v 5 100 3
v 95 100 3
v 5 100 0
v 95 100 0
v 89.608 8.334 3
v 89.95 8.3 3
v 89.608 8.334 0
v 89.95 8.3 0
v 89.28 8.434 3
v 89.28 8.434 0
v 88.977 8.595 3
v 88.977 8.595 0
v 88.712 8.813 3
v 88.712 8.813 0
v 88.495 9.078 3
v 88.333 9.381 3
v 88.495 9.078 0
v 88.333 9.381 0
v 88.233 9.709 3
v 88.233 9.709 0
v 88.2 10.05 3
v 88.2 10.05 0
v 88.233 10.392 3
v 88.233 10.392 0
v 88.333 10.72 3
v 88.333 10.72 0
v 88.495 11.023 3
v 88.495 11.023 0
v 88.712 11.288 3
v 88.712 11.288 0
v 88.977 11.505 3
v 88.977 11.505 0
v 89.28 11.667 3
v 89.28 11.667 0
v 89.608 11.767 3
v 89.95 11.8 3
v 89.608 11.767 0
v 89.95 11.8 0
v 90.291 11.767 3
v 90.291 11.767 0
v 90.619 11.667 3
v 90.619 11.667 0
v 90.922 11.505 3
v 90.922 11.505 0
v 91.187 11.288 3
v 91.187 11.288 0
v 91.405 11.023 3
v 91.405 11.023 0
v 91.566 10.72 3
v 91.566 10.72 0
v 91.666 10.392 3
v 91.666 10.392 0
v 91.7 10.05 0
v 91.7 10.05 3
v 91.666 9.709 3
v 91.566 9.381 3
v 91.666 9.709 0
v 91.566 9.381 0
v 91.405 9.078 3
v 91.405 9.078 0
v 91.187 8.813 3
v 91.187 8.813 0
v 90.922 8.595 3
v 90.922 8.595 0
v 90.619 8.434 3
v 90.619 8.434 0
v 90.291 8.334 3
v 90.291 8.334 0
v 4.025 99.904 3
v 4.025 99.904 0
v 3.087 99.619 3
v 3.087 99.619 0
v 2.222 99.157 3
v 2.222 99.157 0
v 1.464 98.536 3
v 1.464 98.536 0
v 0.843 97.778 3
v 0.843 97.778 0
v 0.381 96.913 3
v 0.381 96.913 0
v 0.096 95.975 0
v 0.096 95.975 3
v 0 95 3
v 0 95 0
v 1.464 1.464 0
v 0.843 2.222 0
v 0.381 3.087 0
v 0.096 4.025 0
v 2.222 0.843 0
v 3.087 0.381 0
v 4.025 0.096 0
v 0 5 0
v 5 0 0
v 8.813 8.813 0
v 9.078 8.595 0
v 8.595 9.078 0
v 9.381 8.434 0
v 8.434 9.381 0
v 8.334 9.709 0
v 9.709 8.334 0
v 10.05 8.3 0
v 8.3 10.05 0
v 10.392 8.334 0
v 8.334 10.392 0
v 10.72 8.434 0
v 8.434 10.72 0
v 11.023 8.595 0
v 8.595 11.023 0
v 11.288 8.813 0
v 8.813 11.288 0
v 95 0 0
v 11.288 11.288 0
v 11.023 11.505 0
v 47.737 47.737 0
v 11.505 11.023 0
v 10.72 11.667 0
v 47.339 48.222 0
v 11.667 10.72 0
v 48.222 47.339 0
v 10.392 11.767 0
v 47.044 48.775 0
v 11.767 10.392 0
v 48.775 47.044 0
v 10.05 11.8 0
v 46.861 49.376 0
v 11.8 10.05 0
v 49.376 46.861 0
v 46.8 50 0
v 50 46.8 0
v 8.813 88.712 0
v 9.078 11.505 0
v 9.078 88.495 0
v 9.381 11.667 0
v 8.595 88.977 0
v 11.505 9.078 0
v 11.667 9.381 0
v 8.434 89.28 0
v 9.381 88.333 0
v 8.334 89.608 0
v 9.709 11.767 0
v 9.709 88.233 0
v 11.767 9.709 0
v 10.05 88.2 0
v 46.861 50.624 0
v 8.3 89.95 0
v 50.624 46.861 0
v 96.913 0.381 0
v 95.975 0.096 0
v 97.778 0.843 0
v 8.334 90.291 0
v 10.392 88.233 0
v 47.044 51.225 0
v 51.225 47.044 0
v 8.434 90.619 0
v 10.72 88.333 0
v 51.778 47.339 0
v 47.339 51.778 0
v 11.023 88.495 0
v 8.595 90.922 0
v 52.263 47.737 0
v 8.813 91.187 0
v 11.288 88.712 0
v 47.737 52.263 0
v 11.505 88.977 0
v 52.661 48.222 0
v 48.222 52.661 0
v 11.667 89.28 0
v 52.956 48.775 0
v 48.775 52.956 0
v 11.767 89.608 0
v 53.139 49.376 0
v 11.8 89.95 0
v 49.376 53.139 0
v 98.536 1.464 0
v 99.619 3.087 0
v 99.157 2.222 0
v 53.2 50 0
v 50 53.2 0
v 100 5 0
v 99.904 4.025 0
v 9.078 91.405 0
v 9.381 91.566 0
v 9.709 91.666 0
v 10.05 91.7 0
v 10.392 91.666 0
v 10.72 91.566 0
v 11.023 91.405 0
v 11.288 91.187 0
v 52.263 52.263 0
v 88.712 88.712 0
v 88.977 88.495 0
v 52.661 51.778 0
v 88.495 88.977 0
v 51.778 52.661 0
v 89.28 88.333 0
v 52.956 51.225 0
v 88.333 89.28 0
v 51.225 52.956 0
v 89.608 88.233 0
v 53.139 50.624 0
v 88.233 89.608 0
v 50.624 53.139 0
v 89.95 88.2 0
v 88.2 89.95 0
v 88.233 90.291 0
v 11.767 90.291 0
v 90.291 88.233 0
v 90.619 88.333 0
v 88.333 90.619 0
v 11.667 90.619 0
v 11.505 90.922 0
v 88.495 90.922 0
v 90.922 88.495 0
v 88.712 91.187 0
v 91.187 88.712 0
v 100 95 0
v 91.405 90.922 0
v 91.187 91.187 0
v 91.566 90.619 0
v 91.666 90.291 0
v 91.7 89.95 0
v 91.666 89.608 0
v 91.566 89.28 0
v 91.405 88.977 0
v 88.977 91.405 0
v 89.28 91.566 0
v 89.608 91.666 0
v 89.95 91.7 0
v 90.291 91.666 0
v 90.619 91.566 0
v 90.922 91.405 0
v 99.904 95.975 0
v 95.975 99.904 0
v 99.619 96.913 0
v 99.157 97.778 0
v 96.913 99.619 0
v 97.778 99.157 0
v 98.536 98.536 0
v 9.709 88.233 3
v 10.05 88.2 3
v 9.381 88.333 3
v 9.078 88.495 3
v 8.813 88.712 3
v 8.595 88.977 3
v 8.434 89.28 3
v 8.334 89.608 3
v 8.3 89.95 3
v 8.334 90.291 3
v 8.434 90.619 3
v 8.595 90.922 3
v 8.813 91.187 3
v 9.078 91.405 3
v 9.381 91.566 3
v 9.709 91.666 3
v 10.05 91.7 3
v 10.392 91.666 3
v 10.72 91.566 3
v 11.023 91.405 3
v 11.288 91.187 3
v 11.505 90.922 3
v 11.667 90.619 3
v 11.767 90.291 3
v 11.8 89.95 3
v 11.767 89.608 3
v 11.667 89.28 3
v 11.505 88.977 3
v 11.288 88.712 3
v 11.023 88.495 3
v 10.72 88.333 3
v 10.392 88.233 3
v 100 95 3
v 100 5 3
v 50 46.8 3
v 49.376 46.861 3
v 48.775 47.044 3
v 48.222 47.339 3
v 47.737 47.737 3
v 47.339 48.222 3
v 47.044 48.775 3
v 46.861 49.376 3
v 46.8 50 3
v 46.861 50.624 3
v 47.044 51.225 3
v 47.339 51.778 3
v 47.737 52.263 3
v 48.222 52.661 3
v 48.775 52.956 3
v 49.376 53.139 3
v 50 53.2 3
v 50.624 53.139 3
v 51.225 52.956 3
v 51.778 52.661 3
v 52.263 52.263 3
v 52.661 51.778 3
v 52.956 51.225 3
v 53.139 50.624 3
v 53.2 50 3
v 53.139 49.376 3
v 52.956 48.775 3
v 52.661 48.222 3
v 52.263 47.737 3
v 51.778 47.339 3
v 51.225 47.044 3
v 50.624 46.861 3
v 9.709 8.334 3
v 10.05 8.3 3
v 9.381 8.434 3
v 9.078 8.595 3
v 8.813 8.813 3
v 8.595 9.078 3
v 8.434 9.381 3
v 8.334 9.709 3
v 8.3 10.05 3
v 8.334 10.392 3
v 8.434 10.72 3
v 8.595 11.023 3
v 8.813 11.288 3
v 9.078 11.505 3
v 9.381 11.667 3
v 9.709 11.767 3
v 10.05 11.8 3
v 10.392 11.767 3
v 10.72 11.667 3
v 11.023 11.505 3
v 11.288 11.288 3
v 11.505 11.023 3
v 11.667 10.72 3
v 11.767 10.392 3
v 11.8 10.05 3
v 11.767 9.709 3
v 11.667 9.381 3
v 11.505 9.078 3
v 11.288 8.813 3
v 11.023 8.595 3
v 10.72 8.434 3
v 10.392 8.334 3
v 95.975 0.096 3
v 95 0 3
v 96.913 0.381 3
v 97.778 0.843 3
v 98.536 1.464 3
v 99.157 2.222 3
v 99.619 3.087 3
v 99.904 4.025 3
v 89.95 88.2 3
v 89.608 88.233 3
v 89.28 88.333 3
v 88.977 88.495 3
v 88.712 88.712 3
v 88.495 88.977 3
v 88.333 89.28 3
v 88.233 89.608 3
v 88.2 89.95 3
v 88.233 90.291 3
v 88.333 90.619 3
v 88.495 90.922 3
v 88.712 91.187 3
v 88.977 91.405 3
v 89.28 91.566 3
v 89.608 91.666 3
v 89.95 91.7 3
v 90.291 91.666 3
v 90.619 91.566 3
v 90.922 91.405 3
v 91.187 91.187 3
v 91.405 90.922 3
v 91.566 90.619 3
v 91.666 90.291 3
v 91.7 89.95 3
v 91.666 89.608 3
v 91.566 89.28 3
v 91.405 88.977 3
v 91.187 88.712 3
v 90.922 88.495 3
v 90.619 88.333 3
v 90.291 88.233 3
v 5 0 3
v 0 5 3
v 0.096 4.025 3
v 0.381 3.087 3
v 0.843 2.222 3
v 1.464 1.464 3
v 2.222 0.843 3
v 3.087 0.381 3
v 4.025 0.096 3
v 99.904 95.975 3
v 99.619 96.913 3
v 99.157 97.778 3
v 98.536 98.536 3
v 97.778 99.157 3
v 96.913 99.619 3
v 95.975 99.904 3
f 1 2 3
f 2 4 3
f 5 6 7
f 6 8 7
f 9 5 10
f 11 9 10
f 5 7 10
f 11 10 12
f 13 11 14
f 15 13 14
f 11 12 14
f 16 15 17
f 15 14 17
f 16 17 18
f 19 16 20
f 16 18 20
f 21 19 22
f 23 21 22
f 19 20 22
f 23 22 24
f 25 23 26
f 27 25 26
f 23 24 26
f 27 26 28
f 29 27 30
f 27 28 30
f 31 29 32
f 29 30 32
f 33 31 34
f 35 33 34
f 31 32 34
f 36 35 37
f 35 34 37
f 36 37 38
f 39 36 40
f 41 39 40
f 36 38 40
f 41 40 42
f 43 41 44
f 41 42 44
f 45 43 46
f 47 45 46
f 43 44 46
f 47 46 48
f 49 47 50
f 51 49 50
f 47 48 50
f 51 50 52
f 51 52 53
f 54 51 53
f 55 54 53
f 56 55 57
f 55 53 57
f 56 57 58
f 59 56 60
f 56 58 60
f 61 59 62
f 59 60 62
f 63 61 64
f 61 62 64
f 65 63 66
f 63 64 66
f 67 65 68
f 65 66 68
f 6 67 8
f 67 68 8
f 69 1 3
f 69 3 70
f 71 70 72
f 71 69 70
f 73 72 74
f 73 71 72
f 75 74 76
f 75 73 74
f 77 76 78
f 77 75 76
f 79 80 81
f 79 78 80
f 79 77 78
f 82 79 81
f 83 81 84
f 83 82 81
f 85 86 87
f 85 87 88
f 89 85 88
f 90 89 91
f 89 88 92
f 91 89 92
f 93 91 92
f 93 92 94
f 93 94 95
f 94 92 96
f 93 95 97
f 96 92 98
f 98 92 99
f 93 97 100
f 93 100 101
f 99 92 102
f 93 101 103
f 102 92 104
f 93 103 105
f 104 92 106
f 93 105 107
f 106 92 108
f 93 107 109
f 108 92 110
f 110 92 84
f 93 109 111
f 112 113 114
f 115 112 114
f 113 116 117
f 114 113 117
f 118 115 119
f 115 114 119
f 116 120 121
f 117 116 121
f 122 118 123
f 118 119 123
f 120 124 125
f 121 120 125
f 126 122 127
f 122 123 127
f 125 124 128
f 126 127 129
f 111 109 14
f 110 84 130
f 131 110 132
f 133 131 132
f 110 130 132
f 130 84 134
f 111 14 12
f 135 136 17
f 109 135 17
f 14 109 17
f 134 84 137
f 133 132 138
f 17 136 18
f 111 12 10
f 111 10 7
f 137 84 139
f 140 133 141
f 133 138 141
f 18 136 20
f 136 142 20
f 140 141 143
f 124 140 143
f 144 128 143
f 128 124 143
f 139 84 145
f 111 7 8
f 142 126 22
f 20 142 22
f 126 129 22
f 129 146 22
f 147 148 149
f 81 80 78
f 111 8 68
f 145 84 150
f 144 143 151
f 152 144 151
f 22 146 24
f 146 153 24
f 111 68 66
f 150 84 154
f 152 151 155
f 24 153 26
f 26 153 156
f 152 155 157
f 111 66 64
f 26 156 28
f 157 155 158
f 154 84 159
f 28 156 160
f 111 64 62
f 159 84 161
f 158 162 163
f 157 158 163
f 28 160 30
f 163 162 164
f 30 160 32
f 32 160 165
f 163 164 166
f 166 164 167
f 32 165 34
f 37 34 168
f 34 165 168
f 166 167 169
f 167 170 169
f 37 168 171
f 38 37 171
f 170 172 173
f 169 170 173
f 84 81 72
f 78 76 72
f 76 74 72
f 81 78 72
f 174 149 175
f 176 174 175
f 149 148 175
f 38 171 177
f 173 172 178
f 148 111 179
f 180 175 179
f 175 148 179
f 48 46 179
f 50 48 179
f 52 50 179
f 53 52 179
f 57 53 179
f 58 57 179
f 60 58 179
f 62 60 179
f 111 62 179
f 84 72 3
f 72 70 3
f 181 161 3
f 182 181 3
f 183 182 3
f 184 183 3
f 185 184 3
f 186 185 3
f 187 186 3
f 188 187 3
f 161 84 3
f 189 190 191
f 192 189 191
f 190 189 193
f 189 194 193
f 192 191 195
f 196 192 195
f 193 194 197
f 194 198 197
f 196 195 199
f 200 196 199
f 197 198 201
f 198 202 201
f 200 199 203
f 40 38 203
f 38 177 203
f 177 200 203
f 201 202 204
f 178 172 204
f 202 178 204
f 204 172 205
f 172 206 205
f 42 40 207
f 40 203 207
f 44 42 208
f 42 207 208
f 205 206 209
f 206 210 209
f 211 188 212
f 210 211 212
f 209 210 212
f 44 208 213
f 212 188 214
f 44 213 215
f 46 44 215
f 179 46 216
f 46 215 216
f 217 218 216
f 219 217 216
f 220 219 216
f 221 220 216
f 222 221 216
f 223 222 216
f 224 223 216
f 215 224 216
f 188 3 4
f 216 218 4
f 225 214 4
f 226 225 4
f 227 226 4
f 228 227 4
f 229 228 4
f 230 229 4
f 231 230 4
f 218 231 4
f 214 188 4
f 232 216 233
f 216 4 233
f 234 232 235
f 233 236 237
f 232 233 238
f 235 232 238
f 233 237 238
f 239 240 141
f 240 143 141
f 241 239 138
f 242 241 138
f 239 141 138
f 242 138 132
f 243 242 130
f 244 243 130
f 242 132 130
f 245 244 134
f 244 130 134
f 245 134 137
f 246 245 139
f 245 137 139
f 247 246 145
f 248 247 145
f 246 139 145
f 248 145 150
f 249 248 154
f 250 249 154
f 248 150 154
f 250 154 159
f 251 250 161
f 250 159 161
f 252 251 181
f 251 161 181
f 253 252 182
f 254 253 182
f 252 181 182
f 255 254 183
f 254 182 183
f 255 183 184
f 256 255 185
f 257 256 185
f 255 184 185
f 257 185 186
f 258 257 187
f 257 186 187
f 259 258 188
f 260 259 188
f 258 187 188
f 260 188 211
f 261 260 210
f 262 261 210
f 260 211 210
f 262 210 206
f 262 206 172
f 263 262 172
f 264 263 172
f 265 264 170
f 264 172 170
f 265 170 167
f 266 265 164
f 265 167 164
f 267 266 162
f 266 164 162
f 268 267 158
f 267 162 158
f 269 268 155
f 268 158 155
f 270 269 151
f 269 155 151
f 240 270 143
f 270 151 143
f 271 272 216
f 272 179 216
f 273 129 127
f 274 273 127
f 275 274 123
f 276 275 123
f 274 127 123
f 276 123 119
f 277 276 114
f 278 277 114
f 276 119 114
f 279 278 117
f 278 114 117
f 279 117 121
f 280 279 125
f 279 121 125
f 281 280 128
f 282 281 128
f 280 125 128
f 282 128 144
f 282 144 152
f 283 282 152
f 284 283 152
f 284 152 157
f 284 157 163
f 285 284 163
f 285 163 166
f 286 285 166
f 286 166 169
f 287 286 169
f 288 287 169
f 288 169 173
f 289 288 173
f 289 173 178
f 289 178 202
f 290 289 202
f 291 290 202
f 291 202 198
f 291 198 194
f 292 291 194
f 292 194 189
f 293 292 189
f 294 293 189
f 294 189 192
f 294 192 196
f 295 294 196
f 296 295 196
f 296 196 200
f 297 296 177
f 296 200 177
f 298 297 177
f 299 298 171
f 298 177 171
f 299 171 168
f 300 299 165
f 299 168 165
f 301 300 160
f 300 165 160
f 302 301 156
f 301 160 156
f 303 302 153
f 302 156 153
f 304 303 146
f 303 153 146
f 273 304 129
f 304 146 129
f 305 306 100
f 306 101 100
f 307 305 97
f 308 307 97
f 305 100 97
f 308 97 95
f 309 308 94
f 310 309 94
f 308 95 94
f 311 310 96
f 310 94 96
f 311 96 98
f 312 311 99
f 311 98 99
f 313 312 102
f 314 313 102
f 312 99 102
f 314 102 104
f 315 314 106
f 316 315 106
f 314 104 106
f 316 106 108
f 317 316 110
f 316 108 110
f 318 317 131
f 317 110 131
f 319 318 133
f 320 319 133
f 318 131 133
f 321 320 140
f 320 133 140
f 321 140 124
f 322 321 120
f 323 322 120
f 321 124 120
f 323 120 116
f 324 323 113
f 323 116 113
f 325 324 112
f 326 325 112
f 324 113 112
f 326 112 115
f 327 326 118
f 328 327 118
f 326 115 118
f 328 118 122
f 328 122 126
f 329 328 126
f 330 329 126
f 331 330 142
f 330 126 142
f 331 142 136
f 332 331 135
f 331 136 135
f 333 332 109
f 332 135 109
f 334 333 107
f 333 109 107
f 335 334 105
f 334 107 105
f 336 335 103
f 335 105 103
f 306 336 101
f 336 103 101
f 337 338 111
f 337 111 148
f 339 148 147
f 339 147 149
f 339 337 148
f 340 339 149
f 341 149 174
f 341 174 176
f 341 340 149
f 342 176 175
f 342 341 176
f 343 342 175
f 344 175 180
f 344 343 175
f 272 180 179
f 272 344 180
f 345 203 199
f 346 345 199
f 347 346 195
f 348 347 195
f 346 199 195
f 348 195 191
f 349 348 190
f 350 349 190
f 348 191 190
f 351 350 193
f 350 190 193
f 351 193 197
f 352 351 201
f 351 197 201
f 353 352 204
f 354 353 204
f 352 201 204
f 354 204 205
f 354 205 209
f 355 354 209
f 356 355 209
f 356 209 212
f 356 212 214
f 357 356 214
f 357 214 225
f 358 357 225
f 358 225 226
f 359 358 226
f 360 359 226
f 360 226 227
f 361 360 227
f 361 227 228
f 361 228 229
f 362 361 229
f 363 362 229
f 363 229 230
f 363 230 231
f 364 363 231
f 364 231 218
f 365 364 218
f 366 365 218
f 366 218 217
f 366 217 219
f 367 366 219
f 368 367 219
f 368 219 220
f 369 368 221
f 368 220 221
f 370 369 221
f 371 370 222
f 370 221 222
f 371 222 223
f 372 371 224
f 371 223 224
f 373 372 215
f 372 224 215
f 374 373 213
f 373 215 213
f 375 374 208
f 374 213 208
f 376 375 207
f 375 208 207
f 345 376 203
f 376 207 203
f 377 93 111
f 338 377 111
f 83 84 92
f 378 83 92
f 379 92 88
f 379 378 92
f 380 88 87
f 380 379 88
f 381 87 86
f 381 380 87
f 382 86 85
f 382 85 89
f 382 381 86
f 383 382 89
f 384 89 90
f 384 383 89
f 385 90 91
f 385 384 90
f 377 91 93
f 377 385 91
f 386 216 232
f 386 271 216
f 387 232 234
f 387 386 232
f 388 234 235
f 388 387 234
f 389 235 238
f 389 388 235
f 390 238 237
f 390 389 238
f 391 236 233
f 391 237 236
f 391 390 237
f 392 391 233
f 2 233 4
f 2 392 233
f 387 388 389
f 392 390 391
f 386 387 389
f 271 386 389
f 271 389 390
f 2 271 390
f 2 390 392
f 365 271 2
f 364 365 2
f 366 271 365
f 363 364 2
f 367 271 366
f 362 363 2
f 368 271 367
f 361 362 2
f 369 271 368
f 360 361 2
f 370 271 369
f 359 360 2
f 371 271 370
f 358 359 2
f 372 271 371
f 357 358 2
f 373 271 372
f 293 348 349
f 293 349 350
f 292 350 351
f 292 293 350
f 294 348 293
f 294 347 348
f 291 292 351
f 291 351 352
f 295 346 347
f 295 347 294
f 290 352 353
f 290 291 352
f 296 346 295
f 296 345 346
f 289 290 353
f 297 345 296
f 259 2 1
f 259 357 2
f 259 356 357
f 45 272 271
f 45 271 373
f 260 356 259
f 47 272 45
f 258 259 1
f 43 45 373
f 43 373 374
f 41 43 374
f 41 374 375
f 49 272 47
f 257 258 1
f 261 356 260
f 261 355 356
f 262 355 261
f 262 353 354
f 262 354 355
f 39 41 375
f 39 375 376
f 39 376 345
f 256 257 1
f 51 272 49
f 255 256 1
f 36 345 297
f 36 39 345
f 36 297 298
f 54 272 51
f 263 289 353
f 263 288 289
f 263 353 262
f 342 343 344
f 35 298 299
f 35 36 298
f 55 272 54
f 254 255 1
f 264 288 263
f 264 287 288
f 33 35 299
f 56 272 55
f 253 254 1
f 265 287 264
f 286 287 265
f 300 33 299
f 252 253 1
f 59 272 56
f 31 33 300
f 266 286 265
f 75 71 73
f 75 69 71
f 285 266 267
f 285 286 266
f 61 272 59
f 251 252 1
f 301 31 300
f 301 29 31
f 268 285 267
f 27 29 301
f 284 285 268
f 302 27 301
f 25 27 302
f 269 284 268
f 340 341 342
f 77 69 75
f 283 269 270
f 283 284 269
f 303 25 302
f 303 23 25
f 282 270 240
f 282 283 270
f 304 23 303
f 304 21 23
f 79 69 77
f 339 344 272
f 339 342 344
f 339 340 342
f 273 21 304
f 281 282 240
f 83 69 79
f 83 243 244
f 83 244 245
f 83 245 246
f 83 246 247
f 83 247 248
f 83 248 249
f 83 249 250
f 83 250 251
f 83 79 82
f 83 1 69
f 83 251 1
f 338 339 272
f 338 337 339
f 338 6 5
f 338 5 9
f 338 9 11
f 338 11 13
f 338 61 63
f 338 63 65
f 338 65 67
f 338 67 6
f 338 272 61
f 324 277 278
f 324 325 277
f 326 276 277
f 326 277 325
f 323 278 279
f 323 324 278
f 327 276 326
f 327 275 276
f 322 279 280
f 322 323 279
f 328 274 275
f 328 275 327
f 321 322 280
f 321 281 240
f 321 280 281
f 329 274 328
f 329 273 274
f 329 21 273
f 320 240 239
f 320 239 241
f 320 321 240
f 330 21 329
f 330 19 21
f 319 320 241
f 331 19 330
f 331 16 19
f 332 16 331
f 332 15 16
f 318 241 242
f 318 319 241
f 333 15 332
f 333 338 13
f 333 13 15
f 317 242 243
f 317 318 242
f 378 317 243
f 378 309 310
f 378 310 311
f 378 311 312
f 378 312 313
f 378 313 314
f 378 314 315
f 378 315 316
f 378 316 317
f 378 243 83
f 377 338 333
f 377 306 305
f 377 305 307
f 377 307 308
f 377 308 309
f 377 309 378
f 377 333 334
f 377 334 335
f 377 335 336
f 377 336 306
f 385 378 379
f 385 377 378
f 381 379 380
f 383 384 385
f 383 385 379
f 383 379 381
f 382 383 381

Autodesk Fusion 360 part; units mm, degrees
sketch "Sketch1" plane through (0, 0, 0) normal (0, 0, 1) x (1, 0, 0)
  line L0 (0, 0) -> (100, 0)
  line L1 (100, 0) -> (100, 100)
  line L2 (100, 100) -> (0, 100)
  line L3 (0, 100) -> (0, 0)
  dimension "d1" = 100
  dimension "d2" = 100
extrude "Extrude1" add sketch "Sketch1" along normal blind 5
sketch "Sketch2" plane through (0, 0, 5) normal (0, 0, 1) x (-1, 0, 0)
  line L0 (0, -100) -> (0, 0)
  line L1 (0, 0) -> (-100, 0)
  line L2 (-100, 0) -> (-100, -100)
  line L3 (-100, -100) -> (0, -100)
  line L4 (-15, -15) -> (-85, -15)
  line L5 (-85, -15) -> (-85, -85)
  line L6 (-85, -85) -> (-15, -85)
  line L7 (-15, -85) -> (-15, -15)
  line L8 (-15, -85) -> (-10.0503, -89.9497)
  line L9 (-15, -85) -> (-8, -85) construction
  line L10 (-85, -85) -> (-89.9497, -89.9497)
  line L11 (-85, -85) -> (-78, -85) construction
  line L12 (-15, -15) -> (-10.0503, -10.0503)
  line L13 (-15, -15) -> (-8, -15) construction
  line L14 (-85, -15) -> (-89.9497, -10.0503)
  line L15 (-85, -15) -> (-78, -15) construction
  dimension "d5" = 45
  dimension "d6" = 7
  dimension "d7" = 135
  dimension "d8" = 7
  dimension "d9" = 7
  dimension "d10" = 45
  dimension "d11" = 135
  dimension "d12" = 7
extrude "Extrude2" cut sketch "Sketch2" against normal blind 2 contours L0 L1 L2 L3 | L4 L5 L6 L7
hole "Hole1" at (89.9497, 89.9497, 5) direction (0, 0, -1) diameter 3 depth 67 tip angle 118
hole "Hole2" at (10.0503, 89.9497, 5) direction (0, 0, -1) diameter 3 depth 4.7 tip angle 118
hole "Hole3" at (10.0503, 10.0503, 5) at (89.9497, 10.0503, 5) direction (0, 0, -1) diameter 3 depth 4.7 tip angle 118
hole "Hole4" at (50, 50, 3) direction (0, 0, -1) diameter 6.4 depth 5 tip angle 180
hole "Hole5" at (10.0503, 89.9497, 3) direction (0, 0, -1) diameter 3 depth 5 tip angle 180
hole "Hole6" at (10.0503, 10.0503, 3) direction (0, 0, -1) diameter 3 depth 5 tip angle 180
hole "Hole7" at (89.9497, 10.0503, 3) direction (0, 0, -1) diameter 3 depth 5 tip angle 180
fillet "Fillet1" radius 5 4 edges at (0, 0, 1.5) (100, 0, 1.5) (100, 100, 1.5) (0, 100, 1.5)
hole "Hole8" at (10.0503, 89.9497, 5) at (89.9497, 89.9497, 5) at (10.0503, 10.0503, 5) at (89.9497, 10.0503, 5) direction (0, 0, -1) diameter 3.5 depth 100 tip angle 180
